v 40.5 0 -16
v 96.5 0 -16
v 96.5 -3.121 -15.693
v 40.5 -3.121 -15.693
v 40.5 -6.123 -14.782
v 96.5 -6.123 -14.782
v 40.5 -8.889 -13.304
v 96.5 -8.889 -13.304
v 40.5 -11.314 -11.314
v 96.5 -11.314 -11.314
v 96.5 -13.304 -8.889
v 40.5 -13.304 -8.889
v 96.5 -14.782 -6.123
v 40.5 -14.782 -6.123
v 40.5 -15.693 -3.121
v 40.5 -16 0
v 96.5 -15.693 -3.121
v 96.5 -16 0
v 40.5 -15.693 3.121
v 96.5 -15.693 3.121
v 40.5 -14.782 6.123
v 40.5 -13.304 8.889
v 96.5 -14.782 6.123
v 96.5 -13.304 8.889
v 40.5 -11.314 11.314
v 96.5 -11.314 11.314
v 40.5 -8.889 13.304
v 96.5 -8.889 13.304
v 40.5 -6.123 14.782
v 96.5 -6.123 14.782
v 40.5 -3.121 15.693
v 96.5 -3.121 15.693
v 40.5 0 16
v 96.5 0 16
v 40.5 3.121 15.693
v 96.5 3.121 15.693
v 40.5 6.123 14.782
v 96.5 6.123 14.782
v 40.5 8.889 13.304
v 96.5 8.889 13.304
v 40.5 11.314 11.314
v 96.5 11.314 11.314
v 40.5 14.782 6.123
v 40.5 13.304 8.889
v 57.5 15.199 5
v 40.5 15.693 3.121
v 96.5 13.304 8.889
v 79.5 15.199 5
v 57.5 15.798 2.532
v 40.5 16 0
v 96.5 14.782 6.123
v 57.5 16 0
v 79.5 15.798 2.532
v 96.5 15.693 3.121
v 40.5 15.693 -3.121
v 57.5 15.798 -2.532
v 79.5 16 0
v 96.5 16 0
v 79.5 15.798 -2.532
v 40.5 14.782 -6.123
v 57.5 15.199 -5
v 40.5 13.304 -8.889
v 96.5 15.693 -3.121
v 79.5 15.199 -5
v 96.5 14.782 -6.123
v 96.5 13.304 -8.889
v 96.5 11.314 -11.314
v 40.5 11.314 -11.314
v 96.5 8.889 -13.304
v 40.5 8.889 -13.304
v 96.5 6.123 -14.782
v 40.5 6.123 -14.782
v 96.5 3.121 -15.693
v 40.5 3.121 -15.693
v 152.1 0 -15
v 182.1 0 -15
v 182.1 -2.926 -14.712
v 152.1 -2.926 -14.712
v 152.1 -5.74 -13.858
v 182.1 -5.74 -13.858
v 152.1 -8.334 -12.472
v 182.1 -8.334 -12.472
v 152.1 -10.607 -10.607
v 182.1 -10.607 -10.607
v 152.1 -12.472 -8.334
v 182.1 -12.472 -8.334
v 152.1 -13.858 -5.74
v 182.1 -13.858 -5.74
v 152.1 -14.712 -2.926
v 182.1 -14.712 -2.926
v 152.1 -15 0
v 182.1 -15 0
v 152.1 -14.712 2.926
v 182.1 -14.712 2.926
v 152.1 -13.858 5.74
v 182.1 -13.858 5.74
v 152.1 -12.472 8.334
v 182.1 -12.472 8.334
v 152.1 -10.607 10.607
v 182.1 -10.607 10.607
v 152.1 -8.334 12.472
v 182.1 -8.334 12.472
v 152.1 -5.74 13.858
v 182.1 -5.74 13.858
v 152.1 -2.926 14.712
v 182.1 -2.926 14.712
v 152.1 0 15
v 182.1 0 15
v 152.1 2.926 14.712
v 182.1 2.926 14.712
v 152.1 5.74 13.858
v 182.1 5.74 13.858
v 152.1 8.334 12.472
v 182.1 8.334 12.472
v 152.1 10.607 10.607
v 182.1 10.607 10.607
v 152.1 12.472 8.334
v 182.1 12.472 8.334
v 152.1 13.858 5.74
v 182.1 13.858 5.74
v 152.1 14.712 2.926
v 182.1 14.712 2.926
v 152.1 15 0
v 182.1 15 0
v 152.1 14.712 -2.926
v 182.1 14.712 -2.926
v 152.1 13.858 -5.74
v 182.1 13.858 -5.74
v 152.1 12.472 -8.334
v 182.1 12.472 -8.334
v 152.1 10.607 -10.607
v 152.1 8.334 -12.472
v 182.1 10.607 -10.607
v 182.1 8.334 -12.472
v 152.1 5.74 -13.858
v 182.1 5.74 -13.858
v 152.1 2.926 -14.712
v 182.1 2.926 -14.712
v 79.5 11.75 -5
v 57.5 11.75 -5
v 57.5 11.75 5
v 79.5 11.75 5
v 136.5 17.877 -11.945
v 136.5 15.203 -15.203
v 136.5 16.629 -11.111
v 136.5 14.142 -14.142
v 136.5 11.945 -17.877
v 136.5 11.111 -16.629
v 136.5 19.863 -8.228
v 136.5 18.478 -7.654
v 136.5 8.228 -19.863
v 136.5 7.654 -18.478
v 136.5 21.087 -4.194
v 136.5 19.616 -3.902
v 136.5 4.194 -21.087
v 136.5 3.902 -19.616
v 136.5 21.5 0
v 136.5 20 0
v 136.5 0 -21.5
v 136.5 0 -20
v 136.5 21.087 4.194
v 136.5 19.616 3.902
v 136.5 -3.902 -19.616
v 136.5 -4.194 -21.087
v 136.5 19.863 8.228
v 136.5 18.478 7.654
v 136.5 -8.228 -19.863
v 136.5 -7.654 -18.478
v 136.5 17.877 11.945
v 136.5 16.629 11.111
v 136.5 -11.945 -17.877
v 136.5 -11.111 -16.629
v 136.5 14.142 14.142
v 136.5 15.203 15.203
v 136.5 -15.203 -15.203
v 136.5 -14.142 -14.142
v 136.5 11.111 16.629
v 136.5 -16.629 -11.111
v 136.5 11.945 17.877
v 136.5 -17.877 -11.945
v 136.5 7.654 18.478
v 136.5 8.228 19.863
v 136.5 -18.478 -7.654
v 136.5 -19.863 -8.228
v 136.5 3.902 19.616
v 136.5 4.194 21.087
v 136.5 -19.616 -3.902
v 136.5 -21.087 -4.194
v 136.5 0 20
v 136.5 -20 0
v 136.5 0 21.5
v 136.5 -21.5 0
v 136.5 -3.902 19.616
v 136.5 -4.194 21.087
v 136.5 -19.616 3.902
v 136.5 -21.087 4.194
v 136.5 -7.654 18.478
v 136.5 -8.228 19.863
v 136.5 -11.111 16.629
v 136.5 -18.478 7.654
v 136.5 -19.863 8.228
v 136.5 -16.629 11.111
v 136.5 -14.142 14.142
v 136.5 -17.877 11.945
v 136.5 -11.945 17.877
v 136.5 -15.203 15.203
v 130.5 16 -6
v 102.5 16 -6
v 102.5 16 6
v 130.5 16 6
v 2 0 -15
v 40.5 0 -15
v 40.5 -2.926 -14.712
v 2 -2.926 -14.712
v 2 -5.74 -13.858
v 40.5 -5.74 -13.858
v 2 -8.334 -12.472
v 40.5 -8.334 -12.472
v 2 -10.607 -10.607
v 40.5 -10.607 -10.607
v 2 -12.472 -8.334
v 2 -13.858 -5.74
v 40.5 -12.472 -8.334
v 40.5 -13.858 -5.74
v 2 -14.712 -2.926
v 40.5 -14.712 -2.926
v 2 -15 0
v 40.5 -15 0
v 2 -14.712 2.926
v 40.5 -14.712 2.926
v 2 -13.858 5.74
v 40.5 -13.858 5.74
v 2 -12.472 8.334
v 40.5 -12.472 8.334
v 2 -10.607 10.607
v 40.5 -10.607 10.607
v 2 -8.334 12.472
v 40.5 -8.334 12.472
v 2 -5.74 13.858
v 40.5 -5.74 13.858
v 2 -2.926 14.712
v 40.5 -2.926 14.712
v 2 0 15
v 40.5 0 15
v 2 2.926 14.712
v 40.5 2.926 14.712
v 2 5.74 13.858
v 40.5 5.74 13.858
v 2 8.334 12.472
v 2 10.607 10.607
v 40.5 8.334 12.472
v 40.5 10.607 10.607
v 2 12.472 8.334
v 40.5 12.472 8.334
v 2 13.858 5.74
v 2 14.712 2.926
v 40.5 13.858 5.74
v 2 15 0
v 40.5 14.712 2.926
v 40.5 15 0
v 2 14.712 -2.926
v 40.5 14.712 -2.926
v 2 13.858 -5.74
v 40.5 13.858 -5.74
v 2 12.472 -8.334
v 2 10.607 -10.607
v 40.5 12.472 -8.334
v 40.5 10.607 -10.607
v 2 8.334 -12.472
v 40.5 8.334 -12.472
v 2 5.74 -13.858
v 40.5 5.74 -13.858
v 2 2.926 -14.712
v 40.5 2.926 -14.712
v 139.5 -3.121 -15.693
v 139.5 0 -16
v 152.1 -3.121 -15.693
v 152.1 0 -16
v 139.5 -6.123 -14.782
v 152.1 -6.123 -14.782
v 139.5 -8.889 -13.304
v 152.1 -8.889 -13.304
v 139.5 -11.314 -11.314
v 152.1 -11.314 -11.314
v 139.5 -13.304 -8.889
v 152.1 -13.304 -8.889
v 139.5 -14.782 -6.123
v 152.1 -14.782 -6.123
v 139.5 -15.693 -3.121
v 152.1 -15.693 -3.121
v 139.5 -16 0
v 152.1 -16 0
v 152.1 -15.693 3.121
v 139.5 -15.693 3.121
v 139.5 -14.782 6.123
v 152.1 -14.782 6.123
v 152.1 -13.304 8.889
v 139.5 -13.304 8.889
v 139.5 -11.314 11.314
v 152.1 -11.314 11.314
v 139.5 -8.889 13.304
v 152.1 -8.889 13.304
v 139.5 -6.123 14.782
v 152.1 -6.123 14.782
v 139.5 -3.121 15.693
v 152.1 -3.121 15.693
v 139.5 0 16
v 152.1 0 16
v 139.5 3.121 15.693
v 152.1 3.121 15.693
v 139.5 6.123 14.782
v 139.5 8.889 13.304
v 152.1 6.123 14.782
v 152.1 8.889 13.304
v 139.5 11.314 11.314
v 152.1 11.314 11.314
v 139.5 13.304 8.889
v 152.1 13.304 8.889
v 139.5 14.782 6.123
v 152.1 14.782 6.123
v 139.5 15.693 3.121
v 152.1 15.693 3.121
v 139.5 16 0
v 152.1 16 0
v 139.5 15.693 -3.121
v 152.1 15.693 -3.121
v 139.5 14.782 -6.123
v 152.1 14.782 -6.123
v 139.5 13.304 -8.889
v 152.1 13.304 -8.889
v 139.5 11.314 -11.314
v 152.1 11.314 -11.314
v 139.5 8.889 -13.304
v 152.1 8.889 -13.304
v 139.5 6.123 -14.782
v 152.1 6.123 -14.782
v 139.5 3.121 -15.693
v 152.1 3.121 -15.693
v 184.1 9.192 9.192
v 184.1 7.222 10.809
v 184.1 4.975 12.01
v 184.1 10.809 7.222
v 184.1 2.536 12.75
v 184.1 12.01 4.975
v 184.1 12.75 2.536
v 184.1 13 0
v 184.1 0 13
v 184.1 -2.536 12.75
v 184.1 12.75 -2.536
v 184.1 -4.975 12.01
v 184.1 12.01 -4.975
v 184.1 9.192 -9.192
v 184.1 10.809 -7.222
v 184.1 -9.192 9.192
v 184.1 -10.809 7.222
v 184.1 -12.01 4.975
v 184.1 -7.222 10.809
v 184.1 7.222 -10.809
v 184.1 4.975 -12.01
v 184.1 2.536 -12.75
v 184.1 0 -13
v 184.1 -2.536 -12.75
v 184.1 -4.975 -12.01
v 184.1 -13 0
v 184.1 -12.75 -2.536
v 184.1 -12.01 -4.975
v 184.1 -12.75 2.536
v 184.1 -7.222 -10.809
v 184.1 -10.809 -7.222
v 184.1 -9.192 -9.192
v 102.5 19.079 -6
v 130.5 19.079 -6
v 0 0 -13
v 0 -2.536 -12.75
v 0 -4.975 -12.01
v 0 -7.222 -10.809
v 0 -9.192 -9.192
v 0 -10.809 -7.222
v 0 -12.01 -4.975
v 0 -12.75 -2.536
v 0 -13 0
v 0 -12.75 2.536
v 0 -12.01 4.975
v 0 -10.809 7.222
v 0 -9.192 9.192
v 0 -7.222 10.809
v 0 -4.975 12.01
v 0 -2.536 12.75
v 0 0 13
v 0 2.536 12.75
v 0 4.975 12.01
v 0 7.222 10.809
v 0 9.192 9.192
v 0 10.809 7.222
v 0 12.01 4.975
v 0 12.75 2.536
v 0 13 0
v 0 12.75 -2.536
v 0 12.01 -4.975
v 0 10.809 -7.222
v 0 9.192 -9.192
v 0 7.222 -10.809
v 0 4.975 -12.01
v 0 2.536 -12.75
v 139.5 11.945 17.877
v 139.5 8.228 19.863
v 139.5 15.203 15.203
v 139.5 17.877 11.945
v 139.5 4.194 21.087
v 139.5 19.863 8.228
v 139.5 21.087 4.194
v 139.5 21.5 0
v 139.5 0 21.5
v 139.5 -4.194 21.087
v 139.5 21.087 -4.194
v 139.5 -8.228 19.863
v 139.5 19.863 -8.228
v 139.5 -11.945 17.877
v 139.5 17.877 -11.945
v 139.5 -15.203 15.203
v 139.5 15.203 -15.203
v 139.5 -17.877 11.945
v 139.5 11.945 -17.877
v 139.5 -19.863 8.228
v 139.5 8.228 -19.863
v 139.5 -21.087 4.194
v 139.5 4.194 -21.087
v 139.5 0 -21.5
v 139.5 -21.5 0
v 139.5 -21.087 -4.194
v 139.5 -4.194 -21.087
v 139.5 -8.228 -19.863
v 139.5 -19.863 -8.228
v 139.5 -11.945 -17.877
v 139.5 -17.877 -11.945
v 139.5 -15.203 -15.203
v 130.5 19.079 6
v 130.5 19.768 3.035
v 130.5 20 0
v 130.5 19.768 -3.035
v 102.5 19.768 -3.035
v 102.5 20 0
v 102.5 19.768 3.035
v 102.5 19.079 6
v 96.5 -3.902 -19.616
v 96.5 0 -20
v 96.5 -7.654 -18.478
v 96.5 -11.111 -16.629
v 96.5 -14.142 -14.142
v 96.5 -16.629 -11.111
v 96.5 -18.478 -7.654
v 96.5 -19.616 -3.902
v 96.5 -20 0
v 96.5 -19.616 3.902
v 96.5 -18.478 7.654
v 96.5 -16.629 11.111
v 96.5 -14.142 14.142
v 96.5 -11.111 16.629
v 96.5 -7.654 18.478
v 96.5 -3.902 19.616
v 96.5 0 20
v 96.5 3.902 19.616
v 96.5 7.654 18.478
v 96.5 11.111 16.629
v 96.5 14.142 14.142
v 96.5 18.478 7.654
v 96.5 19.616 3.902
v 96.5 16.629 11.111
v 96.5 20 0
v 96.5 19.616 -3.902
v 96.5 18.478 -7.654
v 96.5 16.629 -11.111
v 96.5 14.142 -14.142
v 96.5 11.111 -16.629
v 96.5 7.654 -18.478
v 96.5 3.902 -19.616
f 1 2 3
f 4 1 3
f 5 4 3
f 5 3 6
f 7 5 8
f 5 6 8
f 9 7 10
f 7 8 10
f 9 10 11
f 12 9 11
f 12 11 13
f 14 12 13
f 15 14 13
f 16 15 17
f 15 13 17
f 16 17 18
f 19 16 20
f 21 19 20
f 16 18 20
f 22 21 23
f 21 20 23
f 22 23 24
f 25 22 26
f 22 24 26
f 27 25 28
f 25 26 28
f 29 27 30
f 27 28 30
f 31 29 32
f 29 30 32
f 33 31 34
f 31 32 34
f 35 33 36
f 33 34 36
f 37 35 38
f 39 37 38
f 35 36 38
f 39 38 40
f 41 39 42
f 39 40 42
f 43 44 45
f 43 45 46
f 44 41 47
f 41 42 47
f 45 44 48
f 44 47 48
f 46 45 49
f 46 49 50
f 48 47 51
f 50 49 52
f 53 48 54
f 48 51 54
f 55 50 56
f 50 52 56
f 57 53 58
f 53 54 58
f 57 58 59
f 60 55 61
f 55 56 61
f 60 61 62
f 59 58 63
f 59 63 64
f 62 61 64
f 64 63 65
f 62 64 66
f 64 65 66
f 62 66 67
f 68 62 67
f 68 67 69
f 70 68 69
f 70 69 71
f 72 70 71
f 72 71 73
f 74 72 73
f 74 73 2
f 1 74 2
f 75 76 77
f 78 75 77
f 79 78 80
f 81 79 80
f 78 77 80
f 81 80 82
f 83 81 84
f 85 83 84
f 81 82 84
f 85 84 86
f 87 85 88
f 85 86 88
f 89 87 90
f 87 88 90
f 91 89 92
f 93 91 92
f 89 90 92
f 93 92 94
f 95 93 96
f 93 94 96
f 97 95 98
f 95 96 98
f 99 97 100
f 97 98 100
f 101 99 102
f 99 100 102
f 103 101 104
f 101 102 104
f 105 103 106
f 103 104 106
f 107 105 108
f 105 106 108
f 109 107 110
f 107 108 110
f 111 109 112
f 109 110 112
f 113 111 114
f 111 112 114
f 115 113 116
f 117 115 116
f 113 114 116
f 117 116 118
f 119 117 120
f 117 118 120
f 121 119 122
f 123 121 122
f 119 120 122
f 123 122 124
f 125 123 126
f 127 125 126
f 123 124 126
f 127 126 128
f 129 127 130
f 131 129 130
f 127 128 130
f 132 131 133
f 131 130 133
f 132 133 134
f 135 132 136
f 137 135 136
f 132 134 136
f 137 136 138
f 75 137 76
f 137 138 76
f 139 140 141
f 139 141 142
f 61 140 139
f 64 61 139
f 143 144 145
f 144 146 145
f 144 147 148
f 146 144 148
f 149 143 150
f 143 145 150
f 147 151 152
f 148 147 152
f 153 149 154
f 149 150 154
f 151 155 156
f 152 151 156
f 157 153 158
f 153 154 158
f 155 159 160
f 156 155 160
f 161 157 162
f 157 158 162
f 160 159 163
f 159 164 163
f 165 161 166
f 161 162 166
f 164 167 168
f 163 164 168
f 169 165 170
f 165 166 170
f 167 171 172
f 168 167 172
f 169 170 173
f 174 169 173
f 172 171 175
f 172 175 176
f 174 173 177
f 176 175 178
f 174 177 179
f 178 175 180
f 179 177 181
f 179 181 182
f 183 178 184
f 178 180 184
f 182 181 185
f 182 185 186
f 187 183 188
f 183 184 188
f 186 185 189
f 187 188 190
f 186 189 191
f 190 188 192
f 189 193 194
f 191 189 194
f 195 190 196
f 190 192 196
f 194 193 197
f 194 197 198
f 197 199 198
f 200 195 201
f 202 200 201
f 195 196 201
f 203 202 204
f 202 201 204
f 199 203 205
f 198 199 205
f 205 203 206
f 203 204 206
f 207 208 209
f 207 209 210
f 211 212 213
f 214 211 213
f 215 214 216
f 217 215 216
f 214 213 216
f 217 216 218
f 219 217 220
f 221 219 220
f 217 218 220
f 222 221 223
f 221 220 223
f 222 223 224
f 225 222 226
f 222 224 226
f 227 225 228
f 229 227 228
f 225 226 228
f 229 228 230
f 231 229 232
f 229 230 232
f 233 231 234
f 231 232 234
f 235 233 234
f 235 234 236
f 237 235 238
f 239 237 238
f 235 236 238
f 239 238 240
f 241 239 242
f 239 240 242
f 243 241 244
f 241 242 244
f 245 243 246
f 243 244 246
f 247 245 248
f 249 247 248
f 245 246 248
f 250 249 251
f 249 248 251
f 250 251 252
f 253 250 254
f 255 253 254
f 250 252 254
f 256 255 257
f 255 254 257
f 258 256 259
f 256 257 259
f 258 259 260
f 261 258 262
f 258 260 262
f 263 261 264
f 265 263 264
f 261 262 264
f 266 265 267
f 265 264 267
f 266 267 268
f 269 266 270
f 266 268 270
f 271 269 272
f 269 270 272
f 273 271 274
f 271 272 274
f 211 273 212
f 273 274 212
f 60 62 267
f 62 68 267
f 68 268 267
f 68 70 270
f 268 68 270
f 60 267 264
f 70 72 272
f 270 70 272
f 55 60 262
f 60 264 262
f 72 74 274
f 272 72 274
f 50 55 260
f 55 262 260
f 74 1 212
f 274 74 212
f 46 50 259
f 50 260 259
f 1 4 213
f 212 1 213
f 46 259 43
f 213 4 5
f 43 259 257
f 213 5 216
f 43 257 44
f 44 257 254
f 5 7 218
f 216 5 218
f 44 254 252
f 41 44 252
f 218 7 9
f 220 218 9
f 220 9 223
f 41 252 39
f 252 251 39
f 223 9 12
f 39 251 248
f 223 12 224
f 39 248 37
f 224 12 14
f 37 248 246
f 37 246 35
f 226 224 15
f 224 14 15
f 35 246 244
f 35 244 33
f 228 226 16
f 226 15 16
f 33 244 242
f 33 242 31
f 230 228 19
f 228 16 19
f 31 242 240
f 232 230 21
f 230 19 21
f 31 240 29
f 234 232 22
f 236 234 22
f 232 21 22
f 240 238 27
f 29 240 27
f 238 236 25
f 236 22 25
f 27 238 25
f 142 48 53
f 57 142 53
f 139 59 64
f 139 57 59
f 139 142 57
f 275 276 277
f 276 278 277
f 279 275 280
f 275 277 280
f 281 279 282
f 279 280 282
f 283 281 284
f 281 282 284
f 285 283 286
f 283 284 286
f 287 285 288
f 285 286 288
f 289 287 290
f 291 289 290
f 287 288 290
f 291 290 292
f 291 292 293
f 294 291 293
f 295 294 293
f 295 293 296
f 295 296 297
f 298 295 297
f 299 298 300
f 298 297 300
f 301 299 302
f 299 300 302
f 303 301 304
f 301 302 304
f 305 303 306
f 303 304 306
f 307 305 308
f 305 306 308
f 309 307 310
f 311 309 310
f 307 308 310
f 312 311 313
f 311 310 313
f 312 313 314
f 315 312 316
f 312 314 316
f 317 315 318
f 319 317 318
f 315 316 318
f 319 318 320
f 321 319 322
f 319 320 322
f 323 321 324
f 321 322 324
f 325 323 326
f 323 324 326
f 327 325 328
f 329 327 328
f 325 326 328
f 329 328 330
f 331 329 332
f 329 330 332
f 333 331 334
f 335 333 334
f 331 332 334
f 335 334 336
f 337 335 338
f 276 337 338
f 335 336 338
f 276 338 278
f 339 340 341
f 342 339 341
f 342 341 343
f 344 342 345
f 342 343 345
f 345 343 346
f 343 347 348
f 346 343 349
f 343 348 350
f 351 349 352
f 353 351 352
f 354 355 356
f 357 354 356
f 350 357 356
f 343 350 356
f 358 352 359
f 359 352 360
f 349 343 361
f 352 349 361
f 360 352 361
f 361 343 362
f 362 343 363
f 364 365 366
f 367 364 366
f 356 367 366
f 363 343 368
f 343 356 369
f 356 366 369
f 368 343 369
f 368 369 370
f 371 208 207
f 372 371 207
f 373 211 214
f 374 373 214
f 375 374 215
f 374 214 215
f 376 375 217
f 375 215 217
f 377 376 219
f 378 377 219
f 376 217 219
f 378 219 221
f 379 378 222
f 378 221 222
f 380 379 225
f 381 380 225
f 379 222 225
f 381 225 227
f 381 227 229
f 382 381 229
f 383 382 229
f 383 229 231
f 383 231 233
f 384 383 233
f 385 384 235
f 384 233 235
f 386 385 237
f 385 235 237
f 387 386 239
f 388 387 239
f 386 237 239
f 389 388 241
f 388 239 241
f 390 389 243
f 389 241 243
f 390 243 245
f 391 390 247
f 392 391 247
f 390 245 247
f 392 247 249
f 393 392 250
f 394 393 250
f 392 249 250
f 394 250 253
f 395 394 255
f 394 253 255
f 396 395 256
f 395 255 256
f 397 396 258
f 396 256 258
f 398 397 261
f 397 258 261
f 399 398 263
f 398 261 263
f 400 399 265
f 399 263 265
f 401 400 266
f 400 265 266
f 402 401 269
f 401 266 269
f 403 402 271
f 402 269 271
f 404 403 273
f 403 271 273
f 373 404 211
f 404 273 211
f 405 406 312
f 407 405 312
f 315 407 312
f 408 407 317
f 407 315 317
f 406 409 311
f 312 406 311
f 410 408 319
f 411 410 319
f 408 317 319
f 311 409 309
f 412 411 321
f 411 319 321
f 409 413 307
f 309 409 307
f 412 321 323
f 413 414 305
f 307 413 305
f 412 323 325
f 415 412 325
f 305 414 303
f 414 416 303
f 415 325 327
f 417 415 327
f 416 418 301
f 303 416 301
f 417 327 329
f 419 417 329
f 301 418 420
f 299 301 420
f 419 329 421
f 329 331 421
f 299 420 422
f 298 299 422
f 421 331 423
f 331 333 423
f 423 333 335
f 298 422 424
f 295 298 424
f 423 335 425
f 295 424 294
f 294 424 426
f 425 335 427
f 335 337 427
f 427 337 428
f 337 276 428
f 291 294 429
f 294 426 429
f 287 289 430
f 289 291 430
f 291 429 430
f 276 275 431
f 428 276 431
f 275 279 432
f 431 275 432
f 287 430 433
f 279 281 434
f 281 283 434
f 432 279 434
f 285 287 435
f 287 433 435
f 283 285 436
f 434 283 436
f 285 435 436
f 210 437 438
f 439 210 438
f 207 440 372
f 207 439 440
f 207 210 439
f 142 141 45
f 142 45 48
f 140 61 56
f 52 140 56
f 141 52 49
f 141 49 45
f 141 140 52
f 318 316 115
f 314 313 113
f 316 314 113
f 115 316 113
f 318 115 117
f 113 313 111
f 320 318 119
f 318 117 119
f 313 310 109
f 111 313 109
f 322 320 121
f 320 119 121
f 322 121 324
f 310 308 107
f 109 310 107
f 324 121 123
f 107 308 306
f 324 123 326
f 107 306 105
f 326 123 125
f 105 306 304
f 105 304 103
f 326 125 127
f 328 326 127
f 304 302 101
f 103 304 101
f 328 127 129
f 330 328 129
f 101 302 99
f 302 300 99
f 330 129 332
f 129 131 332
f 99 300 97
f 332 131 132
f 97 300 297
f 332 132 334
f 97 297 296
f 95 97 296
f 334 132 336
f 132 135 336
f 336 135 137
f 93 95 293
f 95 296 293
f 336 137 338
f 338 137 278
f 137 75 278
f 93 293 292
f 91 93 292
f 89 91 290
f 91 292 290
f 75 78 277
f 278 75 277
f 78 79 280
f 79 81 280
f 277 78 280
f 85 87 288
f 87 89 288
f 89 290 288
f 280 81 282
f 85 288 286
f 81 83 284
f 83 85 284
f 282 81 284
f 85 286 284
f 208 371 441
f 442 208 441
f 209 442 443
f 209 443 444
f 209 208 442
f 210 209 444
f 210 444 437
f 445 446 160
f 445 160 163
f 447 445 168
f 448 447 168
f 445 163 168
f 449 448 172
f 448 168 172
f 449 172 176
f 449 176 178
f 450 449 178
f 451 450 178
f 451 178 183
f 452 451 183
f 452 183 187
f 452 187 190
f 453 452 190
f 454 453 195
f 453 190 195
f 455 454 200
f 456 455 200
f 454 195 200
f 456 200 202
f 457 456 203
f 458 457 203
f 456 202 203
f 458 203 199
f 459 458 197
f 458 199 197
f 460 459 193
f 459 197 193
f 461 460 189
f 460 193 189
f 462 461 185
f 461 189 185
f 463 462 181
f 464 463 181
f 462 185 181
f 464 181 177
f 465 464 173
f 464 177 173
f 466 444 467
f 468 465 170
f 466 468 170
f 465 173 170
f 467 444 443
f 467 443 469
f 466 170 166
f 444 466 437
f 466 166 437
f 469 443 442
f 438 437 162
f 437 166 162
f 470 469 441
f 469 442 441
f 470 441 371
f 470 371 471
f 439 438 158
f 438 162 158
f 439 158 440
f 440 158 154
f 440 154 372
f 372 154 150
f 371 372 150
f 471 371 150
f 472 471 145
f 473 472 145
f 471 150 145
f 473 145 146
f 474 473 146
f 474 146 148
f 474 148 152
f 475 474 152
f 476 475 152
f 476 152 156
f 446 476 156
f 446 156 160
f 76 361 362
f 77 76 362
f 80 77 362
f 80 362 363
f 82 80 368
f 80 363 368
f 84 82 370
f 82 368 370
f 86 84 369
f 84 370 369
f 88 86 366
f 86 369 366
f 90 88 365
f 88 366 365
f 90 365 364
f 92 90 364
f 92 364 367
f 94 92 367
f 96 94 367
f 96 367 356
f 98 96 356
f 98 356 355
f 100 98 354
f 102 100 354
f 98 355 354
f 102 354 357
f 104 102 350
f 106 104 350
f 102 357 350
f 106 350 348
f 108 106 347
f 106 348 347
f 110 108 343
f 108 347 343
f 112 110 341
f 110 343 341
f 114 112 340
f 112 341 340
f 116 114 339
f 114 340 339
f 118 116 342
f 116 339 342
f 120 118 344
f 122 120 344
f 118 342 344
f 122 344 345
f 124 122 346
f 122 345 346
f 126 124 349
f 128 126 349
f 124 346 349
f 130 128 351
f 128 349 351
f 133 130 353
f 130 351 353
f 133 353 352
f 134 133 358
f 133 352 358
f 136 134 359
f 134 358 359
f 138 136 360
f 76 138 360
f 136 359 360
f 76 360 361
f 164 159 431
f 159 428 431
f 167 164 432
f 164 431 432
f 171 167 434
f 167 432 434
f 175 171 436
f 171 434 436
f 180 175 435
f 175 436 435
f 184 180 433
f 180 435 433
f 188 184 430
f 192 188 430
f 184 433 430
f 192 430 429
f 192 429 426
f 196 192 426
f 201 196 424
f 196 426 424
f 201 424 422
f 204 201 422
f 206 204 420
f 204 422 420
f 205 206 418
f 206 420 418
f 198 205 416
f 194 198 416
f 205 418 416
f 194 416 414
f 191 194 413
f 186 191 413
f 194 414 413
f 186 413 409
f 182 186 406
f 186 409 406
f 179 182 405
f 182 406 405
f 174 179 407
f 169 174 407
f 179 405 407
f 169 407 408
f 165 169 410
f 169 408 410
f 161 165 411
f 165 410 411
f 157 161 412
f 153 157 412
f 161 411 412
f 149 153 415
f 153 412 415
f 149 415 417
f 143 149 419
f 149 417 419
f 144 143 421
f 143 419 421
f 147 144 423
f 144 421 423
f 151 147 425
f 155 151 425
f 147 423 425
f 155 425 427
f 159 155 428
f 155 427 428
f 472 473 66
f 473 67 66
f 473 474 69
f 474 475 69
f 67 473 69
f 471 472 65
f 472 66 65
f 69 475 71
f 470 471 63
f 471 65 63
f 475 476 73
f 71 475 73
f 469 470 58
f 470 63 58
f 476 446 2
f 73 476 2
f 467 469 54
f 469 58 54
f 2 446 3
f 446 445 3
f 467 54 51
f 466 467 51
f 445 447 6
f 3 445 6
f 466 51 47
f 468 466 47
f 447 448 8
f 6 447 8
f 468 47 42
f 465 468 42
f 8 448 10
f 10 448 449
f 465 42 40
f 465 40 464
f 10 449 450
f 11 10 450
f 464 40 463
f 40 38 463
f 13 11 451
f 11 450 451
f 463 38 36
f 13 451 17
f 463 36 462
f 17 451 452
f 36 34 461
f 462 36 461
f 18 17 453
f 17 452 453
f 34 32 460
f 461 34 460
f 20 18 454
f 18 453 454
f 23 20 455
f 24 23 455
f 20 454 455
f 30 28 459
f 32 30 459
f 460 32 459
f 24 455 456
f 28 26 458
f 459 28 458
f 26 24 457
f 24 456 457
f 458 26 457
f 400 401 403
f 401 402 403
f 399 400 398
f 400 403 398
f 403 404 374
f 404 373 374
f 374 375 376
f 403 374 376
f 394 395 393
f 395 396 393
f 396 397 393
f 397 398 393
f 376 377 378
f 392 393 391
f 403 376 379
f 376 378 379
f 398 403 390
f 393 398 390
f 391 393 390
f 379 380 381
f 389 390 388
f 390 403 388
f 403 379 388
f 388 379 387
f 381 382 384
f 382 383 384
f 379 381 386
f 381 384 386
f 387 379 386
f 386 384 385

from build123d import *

# Parameters (mm, degrees)
CHAMFER_1_SIZE      = 2
CUT_EXTRUDE_START   = 11.75
SKETCH_3_W          = 22
SKETCH_3_H          = 5
CUT_EXTRUDE_1_DEPTH = 25
CUT_EXTRUDE_START_2 = 16
SKETCH_4_W          = 28
SKETCH_4_H          = 6
CUT_EXTRUDE_2_DEPTH = 11


with BuildPart() as part:
    # 草图2 → 旋转1 (revolve)
    with BuildSketch(Plane(origin=(0, 0, 0), x_dir=(1, 0, 0), z_dir=(0, 1, 0))):
        Polygon((0, 0), (0, 15), (40.5, 15), (40.5, 16), (96.5, 16), (96.5, 20), (136.5, 20), (136.5, 21.5), (139.5, 21.5), (139.5, 16), (152.1, 16), (152.1, 15), (184.1, 15), (184.1, 0), align=None)
    revolve(axis=Axis((184.1, 0, 0), (-1, 0, 0)))

    # 倒角1
    chamfer_1_edges = [part.edges().sort_by_distance(p)[0] for p in [
        (184.1, 0, 15),
        (0, 0, 15),
    ]]
    chamfer(chamfer_1_edges, length=CHAMFER_1_SIZE)

    # 草图3 → 切除-拉伸1 (cut)
    with BuildSketch(Plane(origin=(0, 0, 0), x_dir=(1, 0, 0), z_dir=(0, 1, 0)).offset(CUT_EXTRUDE_START)):
        with Locations((68.5, 2.5)):
            Rectangle(SKETCH_3_W, SKETCH_3_H)
        with Locations((68.5, -2.5)):
            Rectangle(SKETCH_3_W, SKETCH_3_H)
    extrude(amount=CUT_EXTRUDE_1_DEPTH, mode=Mode.SUBTRACT)

    # 草图4 → 切除-拉伸2 (cut)
    with BuildSketch(Plane(origin=(0, 0, 0), x_dir=(1, 0, 0), z_dir=(0, 1, 0)).offset(CUT_EXTRUDE_START_2)):
        with Locations((116.5, 3)):
            Rectangle(SKETCH_4_W, SKETCH_4_H)
        with Locations((116.5, -3)):
            Rectangle(SKETCH_4_W, SKETCH_4_H)
    extrude(amount=CUT_EXTRUDE_2_DEPTH, mode=Mode.SUBTRACT)


solid = part.part
